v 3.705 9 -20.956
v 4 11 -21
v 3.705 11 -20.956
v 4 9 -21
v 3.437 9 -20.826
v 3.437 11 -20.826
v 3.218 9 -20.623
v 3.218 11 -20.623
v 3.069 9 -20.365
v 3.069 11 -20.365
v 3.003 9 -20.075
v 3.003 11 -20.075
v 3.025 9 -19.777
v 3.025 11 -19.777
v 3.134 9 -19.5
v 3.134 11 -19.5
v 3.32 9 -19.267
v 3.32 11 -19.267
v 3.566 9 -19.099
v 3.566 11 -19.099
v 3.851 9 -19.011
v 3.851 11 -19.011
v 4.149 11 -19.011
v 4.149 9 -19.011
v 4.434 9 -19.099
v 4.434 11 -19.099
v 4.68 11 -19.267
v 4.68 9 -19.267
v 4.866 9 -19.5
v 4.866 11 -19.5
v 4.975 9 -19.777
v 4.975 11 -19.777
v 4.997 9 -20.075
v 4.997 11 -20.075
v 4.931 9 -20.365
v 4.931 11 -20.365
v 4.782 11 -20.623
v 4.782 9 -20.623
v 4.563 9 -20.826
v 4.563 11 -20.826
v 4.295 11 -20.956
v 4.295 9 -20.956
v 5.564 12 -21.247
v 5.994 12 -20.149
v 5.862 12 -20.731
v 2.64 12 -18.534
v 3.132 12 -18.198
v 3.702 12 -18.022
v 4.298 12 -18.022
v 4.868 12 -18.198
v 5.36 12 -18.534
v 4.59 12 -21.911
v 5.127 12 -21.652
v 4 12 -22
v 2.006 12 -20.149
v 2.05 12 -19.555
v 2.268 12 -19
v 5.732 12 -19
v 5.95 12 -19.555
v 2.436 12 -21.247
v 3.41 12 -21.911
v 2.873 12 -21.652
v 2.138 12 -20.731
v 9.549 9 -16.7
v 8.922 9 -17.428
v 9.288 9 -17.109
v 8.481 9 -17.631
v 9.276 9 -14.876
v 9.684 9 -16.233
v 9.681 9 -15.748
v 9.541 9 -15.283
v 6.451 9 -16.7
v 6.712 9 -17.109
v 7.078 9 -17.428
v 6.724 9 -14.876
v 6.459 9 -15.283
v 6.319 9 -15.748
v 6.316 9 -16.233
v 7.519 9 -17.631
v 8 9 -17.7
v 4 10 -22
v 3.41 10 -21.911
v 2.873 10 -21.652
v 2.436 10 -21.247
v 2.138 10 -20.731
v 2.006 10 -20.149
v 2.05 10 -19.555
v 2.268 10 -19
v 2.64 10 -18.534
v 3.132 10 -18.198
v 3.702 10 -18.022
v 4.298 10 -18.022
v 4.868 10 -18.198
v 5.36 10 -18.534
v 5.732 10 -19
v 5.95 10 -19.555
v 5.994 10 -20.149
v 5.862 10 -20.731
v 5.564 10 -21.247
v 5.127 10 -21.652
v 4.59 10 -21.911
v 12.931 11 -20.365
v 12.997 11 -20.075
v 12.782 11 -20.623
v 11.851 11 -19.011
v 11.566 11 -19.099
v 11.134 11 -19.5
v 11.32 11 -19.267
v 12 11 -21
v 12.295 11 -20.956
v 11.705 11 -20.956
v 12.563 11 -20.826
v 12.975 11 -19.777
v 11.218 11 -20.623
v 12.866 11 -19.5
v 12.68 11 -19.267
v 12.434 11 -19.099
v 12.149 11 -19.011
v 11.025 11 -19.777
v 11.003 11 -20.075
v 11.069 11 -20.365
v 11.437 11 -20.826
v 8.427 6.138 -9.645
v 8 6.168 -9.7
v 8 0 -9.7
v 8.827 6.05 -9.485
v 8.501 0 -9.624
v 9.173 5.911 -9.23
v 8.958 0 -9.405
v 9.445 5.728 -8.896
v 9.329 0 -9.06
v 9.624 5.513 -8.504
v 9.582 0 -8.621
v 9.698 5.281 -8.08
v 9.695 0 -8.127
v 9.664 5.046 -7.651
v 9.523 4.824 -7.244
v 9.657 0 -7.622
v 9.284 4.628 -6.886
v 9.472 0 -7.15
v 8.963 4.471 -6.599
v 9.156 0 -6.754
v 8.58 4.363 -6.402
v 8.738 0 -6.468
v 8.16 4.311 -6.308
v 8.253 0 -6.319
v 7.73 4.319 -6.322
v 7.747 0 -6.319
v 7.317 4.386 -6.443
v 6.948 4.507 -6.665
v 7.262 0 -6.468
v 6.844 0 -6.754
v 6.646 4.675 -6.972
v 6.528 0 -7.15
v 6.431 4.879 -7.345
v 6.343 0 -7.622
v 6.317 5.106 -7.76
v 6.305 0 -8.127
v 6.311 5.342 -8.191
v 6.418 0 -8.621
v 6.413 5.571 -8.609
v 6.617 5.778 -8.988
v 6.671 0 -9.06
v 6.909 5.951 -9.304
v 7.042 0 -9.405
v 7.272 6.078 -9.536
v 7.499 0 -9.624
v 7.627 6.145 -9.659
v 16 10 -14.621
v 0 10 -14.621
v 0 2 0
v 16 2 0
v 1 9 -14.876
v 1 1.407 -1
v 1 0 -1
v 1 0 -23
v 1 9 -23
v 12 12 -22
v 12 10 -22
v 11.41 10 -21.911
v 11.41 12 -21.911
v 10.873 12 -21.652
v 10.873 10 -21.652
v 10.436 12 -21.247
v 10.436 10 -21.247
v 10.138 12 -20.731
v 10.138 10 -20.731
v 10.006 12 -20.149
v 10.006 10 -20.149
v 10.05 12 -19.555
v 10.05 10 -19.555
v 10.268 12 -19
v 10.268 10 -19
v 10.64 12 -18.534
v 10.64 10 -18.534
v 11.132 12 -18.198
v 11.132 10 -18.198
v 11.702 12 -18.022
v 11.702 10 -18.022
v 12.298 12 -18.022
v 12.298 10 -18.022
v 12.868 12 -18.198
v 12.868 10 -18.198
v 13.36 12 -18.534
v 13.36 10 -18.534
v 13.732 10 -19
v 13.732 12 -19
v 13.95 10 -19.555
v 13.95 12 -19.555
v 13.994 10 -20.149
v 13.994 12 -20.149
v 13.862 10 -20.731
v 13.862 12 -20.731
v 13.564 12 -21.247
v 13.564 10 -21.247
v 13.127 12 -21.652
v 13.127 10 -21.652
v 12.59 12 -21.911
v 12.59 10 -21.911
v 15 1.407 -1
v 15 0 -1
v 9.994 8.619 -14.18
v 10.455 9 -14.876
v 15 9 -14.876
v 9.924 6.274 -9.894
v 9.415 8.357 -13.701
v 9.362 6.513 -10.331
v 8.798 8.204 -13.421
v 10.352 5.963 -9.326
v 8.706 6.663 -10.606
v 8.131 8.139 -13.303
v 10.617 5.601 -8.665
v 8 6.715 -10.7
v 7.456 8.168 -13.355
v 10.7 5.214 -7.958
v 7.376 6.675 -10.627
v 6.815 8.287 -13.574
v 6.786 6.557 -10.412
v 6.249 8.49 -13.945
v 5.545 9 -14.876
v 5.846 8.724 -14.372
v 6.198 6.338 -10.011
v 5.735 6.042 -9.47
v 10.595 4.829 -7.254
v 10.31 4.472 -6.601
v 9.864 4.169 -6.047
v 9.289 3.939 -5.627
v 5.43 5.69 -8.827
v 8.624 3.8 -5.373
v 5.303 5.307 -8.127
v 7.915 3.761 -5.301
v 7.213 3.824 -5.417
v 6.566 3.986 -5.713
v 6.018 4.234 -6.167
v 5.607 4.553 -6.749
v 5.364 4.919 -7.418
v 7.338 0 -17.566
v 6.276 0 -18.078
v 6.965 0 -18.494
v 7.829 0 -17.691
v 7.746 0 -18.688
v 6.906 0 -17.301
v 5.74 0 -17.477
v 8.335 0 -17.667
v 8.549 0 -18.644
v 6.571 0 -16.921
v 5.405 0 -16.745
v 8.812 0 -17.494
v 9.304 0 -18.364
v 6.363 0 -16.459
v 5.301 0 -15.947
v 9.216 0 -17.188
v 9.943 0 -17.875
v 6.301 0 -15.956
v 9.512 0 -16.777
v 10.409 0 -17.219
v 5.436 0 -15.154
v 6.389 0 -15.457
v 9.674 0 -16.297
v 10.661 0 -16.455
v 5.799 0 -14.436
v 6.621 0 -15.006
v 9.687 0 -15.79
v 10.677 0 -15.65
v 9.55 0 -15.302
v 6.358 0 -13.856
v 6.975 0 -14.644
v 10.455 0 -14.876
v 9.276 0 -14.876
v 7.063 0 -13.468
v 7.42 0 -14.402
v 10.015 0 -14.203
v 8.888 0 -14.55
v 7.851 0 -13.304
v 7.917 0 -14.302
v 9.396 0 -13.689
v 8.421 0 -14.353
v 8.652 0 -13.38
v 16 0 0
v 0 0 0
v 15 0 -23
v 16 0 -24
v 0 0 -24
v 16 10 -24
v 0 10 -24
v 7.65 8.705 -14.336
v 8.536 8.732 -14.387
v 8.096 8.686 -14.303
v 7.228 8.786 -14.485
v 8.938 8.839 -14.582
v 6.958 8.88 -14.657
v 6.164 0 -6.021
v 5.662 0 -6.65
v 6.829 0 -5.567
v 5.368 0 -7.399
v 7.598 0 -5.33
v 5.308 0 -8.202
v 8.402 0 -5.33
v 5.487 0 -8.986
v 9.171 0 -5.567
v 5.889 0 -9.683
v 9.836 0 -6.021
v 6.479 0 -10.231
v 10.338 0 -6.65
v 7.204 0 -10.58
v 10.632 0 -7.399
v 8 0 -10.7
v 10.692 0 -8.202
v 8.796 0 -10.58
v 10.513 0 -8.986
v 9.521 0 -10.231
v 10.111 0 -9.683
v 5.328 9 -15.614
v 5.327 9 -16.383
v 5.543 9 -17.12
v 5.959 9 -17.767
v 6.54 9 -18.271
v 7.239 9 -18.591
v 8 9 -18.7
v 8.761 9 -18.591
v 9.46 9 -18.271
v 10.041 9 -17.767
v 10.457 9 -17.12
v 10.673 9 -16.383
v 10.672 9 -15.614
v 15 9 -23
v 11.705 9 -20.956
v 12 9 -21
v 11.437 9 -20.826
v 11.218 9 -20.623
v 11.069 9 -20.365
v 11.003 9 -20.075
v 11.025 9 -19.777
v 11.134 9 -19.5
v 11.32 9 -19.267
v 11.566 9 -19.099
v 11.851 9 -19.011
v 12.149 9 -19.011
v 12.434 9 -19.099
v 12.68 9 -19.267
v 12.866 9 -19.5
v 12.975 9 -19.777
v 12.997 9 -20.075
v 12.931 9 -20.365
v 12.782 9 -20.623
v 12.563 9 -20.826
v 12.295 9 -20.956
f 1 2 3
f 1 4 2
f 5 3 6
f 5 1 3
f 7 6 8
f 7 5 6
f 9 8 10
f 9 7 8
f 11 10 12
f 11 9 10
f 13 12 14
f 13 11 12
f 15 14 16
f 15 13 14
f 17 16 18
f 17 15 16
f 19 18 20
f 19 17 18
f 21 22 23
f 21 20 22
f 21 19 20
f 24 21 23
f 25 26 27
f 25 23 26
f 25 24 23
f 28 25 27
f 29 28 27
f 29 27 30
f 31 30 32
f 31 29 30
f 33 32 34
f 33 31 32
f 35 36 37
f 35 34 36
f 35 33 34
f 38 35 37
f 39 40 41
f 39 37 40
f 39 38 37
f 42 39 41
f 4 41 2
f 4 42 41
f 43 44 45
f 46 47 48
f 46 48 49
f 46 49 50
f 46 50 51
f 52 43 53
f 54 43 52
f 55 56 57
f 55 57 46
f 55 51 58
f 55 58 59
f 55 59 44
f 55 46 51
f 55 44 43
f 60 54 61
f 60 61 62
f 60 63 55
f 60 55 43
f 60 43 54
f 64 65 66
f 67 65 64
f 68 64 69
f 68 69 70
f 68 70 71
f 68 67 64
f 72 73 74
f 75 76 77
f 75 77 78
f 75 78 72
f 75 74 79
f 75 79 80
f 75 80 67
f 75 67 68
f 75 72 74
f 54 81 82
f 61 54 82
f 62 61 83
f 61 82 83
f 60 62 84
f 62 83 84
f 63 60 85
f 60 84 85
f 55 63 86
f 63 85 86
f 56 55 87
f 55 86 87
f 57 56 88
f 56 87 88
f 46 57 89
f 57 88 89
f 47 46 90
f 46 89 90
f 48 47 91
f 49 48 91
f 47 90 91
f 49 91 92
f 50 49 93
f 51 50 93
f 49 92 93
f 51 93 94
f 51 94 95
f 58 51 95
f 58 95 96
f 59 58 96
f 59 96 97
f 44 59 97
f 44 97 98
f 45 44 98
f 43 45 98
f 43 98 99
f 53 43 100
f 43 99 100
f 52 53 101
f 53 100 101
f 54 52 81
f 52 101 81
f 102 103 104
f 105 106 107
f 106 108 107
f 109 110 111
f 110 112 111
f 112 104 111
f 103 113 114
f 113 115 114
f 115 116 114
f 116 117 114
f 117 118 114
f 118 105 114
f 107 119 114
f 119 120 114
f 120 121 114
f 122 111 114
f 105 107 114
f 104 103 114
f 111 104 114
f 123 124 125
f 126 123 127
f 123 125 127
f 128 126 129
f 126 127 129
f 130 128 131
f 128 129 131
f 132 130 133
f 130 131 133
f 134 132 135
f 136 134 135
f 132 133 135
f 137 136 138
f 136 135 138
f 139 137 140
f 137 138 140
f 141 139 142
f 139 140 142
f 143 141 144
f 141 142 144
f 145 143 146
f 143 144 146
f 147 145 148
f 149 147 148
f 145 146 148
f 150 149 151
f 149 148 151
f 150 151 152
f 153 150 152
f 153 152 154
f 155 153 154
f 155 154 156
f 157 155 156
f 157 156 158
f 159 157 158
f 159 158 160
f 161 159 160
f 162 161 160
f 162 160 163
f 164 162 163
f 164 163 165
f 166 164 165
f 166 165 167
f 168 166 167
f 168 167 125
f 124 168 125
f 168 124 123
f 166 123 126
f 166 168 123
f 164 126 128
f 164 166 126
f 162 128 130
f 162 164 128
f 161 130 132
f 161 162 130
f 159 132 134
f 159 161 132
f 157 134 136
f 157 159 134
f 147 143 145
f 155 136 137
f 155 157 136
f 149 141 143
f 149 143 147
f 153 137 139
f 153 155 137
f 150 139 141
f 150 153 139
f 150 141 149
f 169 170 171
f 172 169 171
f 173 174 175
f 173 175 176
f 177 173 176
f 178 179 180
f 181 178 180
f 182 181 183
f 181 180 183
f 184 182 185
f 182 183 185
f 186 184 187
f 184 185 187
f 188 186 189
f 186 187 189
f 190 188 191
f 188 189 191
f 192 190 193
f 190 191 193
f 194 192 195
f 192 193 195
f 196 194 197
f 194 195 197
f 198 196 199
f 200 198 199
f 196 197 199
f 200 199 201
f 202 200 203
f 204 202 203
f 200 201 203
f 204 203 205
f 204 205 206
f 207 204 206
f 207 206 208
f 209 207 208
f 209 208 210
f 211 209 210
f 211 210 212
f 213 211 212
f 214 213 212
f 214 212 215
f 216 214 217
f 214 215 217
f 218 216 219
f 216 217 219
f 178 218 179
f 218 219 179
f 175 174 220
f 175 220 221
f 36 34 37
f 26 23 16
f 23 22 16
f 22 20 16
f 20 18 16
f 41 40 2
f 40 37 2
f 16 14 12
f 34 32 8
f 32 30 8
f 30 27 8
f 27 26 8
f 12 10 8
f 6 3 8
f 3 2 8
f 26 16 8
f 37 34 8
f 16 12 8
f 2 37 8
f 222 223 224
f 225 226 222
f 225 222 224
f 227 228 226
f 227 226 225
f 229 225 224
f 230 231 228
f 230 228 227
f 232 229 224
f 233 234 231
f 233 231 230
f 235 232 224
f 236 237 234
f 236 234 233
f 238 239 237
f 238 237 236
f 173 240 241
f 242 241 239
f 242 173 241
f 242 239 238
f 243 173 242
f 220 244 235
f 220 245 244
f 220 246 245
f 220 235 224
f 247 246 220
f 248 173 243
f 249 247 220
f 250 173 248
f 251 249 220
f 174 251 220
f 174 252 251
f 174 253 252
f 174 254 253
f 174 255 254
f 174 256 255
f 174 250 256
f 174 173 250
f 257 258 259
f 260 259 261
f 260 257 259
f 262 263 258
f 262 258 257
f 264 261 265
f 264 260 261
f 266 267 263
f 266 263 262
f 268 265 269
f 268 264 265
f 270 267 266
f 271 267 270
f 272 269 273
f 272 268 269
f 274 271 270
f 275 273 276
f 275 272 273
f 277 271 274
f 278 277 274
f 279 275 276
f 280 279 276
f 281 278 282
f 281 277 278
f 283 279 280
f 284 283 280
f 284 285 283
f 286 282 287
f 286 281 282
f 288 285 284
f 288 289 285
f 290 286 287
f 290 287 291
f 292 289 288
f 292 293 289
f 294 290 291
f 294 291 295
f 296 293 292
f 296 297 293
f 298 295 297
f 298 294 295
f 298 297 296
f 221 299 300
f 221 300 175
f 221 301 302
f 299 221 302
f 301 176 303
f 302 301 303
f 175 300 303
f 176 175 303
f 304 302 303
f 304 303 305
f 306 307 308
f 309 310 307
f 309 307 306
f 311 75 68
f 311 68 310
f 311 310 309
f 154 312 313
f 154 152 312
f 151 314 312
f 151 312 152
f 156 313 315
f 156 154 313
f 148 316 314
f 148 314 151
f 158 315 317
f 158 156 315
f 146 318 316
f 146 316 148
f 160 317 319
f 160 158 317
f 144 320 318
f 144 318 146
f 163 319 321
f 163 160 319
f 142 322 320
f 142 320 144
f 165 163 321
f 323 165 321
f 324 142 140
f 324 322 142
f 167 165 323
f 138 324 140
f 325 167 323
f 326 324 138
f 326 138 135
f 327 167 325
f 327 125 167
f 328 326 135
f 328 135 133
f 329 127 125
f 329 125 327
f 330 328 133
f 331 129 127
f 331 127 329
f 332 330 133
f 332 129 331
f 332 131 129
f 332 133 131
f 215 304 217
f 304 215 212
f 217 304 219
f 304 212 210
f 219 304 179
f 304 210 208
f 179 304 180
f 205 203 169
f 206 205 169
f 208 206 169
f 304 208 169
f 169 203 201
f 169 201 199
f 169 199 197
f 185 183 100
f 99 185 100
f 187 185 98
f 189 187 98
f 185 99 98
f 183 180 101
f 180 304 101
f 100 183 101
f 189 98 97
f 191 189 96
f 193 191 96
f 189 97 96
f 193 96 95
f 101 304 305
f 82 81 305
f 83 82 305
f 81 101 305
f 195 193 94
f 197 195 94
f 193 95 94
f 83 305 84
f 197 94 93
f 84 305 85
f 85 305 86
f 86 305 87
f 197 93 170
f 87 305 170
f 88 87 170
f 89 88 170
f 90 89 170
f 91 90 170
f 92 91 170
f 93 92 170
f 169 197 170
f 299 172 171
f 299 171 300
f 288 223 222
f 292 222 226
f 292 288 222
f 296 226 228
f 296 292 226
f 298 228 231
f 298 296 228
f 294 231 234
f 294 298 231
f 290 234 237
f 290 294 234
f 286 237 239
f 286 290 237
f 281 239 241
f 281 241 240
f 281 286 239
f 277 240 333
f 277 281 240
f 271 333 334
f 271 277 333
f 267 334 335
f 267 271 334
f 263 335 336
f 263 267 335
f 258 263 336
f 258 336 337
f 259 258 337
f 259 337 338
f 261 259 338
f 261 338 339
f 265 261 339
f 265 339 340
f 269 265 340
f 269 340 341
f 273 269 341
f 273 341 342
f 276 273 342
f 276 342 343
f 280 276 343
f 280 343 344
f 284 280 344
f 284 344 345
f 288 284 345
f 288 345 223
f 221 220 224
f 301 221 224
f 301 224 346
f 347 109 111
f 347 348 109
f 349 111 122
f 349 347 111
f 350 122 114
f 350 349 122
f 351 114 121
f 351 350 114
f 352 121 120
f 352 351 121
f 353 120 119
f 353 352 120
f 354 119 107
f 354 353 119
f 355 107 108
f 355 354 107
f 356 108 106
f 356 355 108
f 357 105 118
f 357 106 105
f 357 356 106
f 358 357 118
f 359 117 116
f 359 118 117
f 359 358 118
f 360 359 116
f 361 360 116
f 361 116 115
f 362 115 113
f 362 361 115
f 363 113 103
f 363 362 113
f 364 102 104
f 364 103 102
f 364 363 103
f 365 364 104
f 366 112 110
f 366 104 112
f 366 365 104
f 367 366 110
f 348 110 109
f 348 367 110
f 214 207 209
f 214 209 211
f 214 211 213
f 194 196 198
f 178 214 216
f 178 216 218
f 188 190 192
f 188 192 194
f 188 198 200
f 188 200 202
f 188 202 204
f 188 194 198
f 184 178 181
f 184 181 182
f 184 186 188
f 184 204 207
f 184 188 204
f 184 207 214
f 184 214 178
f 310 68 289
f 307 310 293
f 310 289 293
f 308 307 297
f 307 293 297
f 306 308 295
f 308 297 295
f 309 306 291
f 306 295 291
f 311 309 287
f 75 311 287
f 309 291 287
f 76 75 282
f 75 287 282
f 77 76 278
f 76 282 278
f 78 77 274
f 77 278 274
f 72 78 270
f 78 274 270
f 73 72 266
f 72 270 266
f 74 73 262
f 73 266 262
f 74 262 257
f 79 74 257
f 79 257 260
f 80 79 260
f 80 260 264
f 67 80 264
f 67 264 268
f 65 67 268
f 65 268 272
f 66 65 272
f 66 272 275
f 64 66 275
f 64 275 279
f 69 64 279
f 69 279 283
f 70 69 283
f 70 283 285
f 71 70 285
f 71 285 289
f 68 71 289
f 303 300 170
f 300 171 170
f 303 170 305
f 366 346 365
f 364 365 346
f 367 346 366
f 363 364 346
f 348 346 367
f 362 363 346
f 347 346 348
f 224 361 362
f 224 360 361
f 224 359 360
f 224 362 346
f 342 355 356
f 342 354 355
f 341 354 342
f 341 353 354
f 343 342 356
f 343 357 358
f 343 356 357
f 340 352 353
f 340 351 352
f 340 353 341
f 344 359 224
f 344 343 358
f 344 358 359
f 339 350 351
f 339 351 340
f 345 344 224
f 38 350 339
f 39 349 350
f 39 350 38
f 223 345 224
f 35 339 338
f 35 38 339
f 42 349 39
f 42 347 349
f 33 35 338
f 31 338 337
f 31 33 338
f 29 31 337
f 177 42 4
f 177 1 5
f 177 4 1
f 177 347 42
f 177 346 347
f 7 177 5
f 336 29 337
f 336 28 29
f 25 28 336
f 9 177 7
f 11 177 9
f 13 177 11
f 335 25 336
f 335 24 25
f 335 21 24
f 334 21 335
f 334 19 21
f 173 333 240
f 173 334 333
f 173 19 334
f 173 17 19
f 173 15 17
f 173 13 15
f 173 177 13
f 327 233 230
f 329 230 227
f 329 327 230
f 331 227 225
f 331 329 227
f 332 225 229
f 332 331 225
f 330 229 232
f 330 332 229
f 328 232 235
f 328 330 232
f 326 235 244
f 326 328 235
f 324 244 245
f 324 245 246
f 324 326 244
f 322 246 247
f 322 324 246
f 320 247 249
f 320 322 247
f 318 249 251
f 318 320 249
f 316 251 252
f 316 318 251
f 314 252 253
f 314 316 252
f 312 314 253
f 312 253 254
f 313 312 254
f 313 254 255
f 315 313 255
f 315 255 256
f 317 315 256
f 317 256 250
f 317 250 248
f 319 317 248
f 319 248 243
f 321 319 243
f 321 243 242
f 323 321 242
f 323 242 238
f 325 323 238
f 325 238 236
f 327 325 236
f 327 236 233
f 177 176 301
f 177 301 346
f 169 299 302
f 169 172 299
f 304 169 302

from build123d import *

# Parameters (mm, degrees)
BOSS_EXTRUDE1_DEPTH = 16
SKETCH2_R           = 2
BOSS_EXTRUDE2_DEPTH = 2
SHELL1_T            = -1
BOSS_EXTRUDE3_REACH = 33.241
SKETCH3_R           = 2.7
SKETCH3_R_2         = 1.7


with BuildPart() as part:
    # Sketch1 → Boss-Extrude1 (new body)
    with BuildSketch(Plane(origin=(0, 0, 0), x_dir=(0, 0, -1), z_dir=(1, 0, 0))):
        Polygon((0, 0), (24, 0), (24, 10), (14.620689655, 10), (0, 2), align=None)
    extrude(amount=BOSS_EXTRUDE1_DEPTH)

    # Sketch2 → Boss-Extrude2 (add)
    with BuildSketch(Plane(origin=(0, 10, 0), x_dir=(1, 0, 0), z_dir=(0, 1, 0))):
        with Locations(Location((4, 20, 0), (0, 0, 90))):
            Circle(SKETCH2_R)
        with Locations(Location((12, 20, 0), (0, 0, 90))):
            Circle(SKETCH2_R)
    extrude(amount=BOSS_EXTRUDE2_DEPTH)

    # Shell1
    shell1_openings = [part.faces().sort_by_distance(p)[0] for p in [
        (8, 0, -12),
    ]]
    offset(amount=SHELL1_T, openings=shell1_openings, kind=Kind.INTERSECTION)

    # Sketch3 → Boss-Extrude3 (add, up to next)
    with BuildSketch(Plane.XZ, mode=Mode.PRIVATE) as boss_extrude3_sk1:
        with Locations(Location((8, -8, 0), (0, 0, 270))):
            Circle(SKETCH3_R)
        with Locations(Location((8, -8, 0), (0, 0, 270))):
            Circle(SKETCH3_R_2, mode=Mode.SUBTRACT)
    boss_extrude3_tool1 = extrude(boss_extrude3_sk1.sketch, amount=-BOSS_EXTRUDE3_REACH, mode=Mode.PRIVATE) - part.part
    # Sketch3 → Boss-Extrude3 (add, up to next)
    with BuildSketch(Plane.XZ, mode=Mode.PRIVATE) as boss_extrude3_sk2:
        with Locations(Location((8, -16, 0), (0, 0, 24.591939532))):
            Circle(SKETCH3_R)
        with Locations(Location((8, -16, 0), (0, 0, 41.372265033))):
            Circle(SKETCH3_R_2, mode=Mode.SUBTRACT)
    boss_extrude3_tool2 = extrude(boss_extrude3_sk2.sketch, amount=-BOSS_EXTRUDE3_REACH, mode=Mode.PRIVATE) - part.part
    add(boss_extrude3_tool1.solids().sort_by_distance((8, 0, -5.376368))[0])
    add(boss_extrude3_tool2.solids().sort_by_distance((5.614345, 0, -17.091832))[0])


solid = part.part
